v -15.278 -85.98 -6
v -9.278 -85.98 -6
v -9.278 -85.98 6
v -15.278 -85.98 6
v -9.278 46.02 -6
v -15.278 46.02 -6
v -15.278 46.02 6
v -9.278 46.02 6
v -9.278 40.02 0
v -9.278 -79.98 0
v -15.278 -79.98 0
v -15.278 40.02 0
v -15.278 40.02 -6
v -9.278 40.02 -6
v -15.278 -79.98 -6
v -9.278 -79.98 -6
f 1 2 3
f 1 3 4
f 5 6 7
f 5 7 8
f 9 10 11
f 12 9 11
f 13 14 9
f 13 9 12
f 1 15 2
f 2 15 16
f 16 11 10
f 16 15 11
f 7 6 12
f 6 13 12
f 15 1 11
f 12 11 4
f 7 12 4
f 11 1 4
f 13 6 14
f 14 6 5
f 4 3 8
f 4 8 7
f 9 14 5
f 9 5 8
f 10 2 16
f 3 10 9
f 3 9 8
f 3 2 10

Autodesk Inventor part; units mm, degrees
ref_plane "YZ Plane" through (0, 0, 0) normal (1, 0, 0) x (0, 1, 0)
ref_plane "XZ Plane" through (0, 0, 0) normal (0, 1, 0) x (-1, 0, 0)
ref_plane "XY Plane" through (0, 0, 0) normal (0, 0, 1) x (1, 0, 0)
sketch "Sketch1" plane through (0, 0, 0) normal (0, 0, 1) x (1, 0, 0)
  line L0 (538.5222, 35.1205) -> (532.3222, 35.1205) projected
  line L1 (538.5222, 52.0205) -> (538.5222, 35.1205) projected
  line L2 (538.5222, 52.0205) -> (246.9222, 52.0205) projected
  line L3 (246.9222, 52.0205) -> (246.9222, 58.0205) projected
  line L4 (246.9222, 58.0205) -> (538.5222, 58.0205) projected
  line L5 (538.5222, 74.9205) -> (538.5222, 58.0205) projected
  line L6 (523.1184, 74.9205) -> (538.5222, 74.9205) projected
  line L7 (517.9222, 77.9205) -> (523.1184, 74.9205) projected
  line L8 (517.9222, 74.9205) -> (517.9222, 77.9205) projected
  arc A0 (515.9222, 74.9205) -> (517.9222, 74.9205) centre (516.9222, 74.9205) ccw projected
  line L9 (515.9222, 77.9205) -> (515.9222, 74.9205) projected
  line L10 (510.7261, 74.9205) -> (515.9222, 77.9205) projected
  line L11 (494.3184, 74.9205) -> (510.7261, 74.9205) projected
  line L12 (489.1222, 77.9205) -> (494.3184, 74.9205) projected
  line L13 (489.1222, 74.9205) -> (489.1222, 77.9205) projected
  arc A1 (487.1222, 74.9205) -> (489.1222, 74.9205) centre (488.1222, 74.9205) ccw projected
  line L14 (487.1222, 77.9205) -> (487.1222, 74.9205) projected
  line L15 (481.9261, 74.9205) -> (487.1222, 77.9205) projected
  line L16 (465.5184, 74.9205) -> (481.9261, 74.9205) projected
  line L17 (460.3222, 77.9205) -> (465.5184, 74.9205) projected
  line L18 (460.3222, 74.9205) -> (460.3222, 77.9205) projected
  arc A2 (458.3222, 74.9205) -> (460.3222, 74.9205) centre (459.3222, 74.9205) ccw projected
  line L19 (458.3222, 77.9205) -> (458.3222, 74.9205) projected
  line L20 (453.1261, 74.9205) -> (458.3222, 77.9205) projected
  line L21 (436.7184, 74.9205) -> (453.1261, 74.9205) projected
  line L22 (431.5222, 77.9205) -> (436.7184, 74.9205) projected
  line L23 (431.5222, 74.9205) -> (431.5222, 77.9205) projected
  arc A3 (429.5222, 74.9205) -> (431.5222, 74.9205) centre (430.5222, 74.9205) ccw projected
  line L24 (429.5222, 77.9205) -> (429.5222, 74.9205) projected
  line L25 (424.3261, 74.9205) -> (429.5222, 77.9205) projected
  line L26 (407.9184, 74.9205) -> (424.3261, 74.9205) projected
  line L27 (402.7222, 77.9205) -> (407.9184, 74.9205) projected
  line L28 (402.7222, 74.9205) -> (402.7222, 77.9205) projected
  arc A4 (400.7222, 74.9205) -> (402.7222, 74.9205) centre (401.7222, 74.9205) ccw projected
  line L29 (400.7222, 77.9205) -> (400.7222, 74.9205) projected
  line L30 (395.5261, 74.9205) -> (400.7222, 77.9205) projected
  line L31 (379.1184, 74.9205) -> (395.5261, 74.9205) projected
  line L32 (373.9222, 77.9205) -> (379.1184, 74.9205) projected
  line L33 (373.9222, 74.9205) -> (373.9222, 77.9205) projected
  arc A5 (371.9222, 74.9205) -> (373.9222, 74.9205) centre (372.9222, 74.9205) ccw projected
  line L34 (371.9222, 77.9205) -> (371.9222, 74.9205) projected
  line L35 (366.7261, 74.9205) -> (371.9222, 77.9205) projected
  line L36 (350.3184, 74.9205) -> (366.7261, 74.9205) projected
  line L37 (345.1222, 77.9205) -> (350.3184, 74.9205) projected
  line L38 (345.1222, 74.9205) -> (345.1222, 77.9205) projected
  arc A6 (343.1222, 74.9205) -> (345.1222, 74.9205) centre (344.1222, 74.9205) ccw projected
  line L39 (343.1222, 77.9205) -> (343.1222, 74.9205) projected
  line L40 (337.9261, 74.9205) -> (343.1222, 77.9205) projected
  line L41 (321.5184, 74.9205) -> (337.9261, 74.9205) projected
  line L42 (316.3222, 77.9205) -> (321.5184, 74.9205) projected
  line L43 (316.3222, 74.9205) -> (316.3222, 77.9205) projected
  arc A7 (314.3222, 74.9205) -> (316.3222, 74.9205) centre (315.3222, 74.9205) ccw projected
  line L44 (314.3222, 77.9205) -> (314.3222, 74.9205) projected
  line L45 (309.1261, 74.9205) -> (314.3222, 77.9205) projected
  line L46 (292.7184, 74.9205) -> (309.1261, 74.9205) projected
  line L47 (287.5222, 77.9205) -> (292.7184, 74.9205) projected
  line L48 (287.5222, 74.9205) -> (287.5222, 77.9205) projected
  arc A8 (285.5222, 74.9205) -> (287.5222, 74.9205) centre (286.5222, 74.9205) ccw projected
  line L49 (285.5222, 77.9205) -> (285.5222, 74.9205) projected
  line L50 (280.3261, 74.9205) -> (285.5222, 77.9205) projected
  line L51 (263.9184, 74.9205) -> (280.3261, 74.9205) projected
  line L52 (258.7222, 77.9205) -> (263.9184, 74.9205) projected
  line L53 (258.7222, 74.9205) -> (258.7222, 77.9205) projected
  arc A9 (256.7222, 74.9205) -> (258.7222, 74.9205) centre (257.7222, 74.9205) ccw projected
  line L54 (256.7222, 77.9205) -> (256.7222, 74.9205) projected
  line L55 (251.5261, 74.9205) -> (256.7222, 77.9205) projected
  line L56 (235.1184, 74.9205) -> (251.5261, 74.9205) projected
  line L57 (229.9222, 77.9205) -> (235.1184, 74.9205) projected
  line L58 (229.9222, 74.9205) -> (229.9222, 77.9205) projected
  arc A10 (227.9222, 74.9205) -> (229.9222, 74.9205) centre (228.9222, 74.9205) ccw projected
  line L59 (227.9222, 77.9205) -> (227.9222, 74.9205) projected
  line L60 (222.7261, 74.9205) -> (227.9222, 77.9205) projected
  line L61 (206.3184, 74.9205) -> (222.7261, 74.9205) projected
  line L62 (201.1222, 77.9205) -> (206.3184, 74.9205) projected
  line L63 (201.1222, 74.9205) -> (201.1222, 77.9205) projected
  arc A11 (199.1222, 74.9205) -> (201.1222, 74.9205) centre (200.1222, 74.9205) ccw projected
  line L64 (199.1222, 77.9205) -> (199.1222, 74.9205) projected
  line L65 (193.9261, 74.9205) -> (199.1222, 77.9205) projected
  line L66 (177.5184, 74.9205) -> (193.9261, 74.9205) projected
  line L67 (172.3222, 77.9205) -> (177.5184, 74.9205) projected
  line L68 (172.3222, 74.9205) -> (172.3222, 77.9205) projected
  arc A12 (170.3222, 74.9205) -> (172.3222, 74.9205) centre (171.3222, 74.9205) ccw projected
  line L69 (170.3222, 77.9205) -> (170.3222, 74.9205) projected
  line L70 (165.1261, 74.9205) -> (170.3222, 77.9205) projected
  line L71 (148.7184, 74.9205) -> (165.1261, 74.9205) projected
  line L72 (143.5222, 77.9205) -> (148.7184, 74.9205) projected
  line L73 (143.5222, 74.9205) -> (143.5222, 77.9205) projected
  arc A13 (141.5222, 74.9205) -> (143.5222, 74.9205) centre (142.5222, 74.9205) ccw projected
  line L74 (141.5222, 77.9205) -> (141.5222, 74.9205) projected
  line L75 (136.3261, 74.9205) -> (141.5222, 77.9205) projected
  line L76 (119.9184, 74.9205) -> (136.3261, 74.9205) projected
  line L77 (114.7222, 77.9205) -> (119.9184, 74.9205) projected
  line L78 (114.7222, 74.9205) -> (114.7222, 77.9205) projected
  arc A14 (112.7222, 74.9205) -> (114.7222, 74.9205) centre (113.7222, 74.9205) ccw projected
  line L79 (112.7222, 77.9205) -> (112.7222, 74.9205) projected
  line L80 (107.5261, 74.9205) -> (112.7222, 77.9205) projected
  line L81 (91.1184, 74.9205) -> (107.5261, 74.9205) projected
  line L82 (85.9222, 77.9205) -> (91.1184, 74.9205) projected
  line L83 (85.9222, 74.9205) -> (85.9222, 77.9205) projected
  arc A15 (83.9222, 74.9205) -> (85.9222, 74.9205) centre (84.9222, 74.9205) ccw projected
  line L84 (83.9222, 77.9205) -> (83.9222, 74.9205) projected
  line L85 (78.7261, 74.9205) -> (83.9222, 77.9205) projected
  line L86 (62.3184, 74.9205) -> (78.7261, 74.9205) projected
  line L87 (57.1222, 77.9205) -> (62.3184, 74.9205) projected
  line L88 (57.1222, 74.9205) -> (57.1222, 77.9205) projected
  arc A16 (55.1222, 74.9205) -> (57.1222, 74.9205) centre (56.1222, 74.9205) ccw projected
  line L89 (55.1222, 77.9205) -> (55.1222, 74.9205) projected
  line L90 (49.9261, 74.9205) -> (55.1222, 77.9205) projected
  line L91 (33.5184, 74.9205) -> (49.9261, 74.9205) projected
  line L92 (28.3222, 77.9205) -> (33.5184, 74.9205) projected
  line L93 (28.3222, 74.9205) -> (28.3222, 77.9205) projected
  arc A17 (26.3222, 74.9205) -> (28.3222, 74.9205) centre (27.3222, 74.9205) ccw projected
  line L94 (26.3222, 77.9205) -> (26.3222, 74.9205) projected
  line L95 (21.1261, 74.9205) -> (26.3222, 77.9205) projected
  line L96 (4.7184, 74.9205) -> (21.1261, 74.9205) projected
  line L97 (-0.4778, 77.9205) -> (4.7184, 74.9205) projected
  line L98 (-0.4778, 74.9205) -> (-0.4778, 77.9205) projected
  arc A18 (-2.4778, 74.9205) -> (-0.4778, 74.9205) centre (-1.4778, 74.9205) ccw projected
  line L99 (-2.4778, 77.9205) -> (-2.4778, 74.9205) projected
  line L100 (-7.6739, 74.9205) -> (-2.4778, 77.9205) projected
  line L101 (-24.0816, 74.9205) -> (-7.6739, 74.9205) projected
  line L102 (-29.2778, 77.9205) -> (-24.0816, 74.9205) projected
  line L103 (-29.2778, 74.9205) -> (-29.2778, 77.9205) projected
  arc A19 (-31.2778, 74.9205) -> (-29.2778, 74.9205) centre (-30.2778, 74.9205) ccw projected
  line L104 (-31.2778, 77.9205) -> (-31.2778, 74.9205) projected
  line L105 (-36.4739, 74.9205) -> (-31.2778, 77.9205) projected
  line L106 (-36.4739, 74.9205) -> (-44.6778, 74.9205) projected
  line L107 (-44.6778, 35.1205) -> (-44.6778, 74.9205) projected
  line L108 (-22.0739, 35.1205) -> (-44.6778, 35.1205) projected
  line L109 (-16.8778, 32.1205) -> (-22.0739, 35.1205) projected
  line L110 (-16.8778, 35.1205) -> (-16.8778, 32.1205) projected
  arc A20 (-14.8778, 35.1205) -> (-16.8778, 35.1205) centre (-15.8778, 35.1205) ccw projected
  line L111 (-14.8778, 32.1205) -> (-14.8778, 35.1205) projected
  line L112 (-9.6816, 35.1205) -> (-14.8778, 32.1205) projected
  line L113 (6.7261, 35.1205) -> (-9.6816, 35.1205) projected
  line L114 (11.9222, 32.1205) -> (6.7261, 35.1205) projected
  line L115 (11.9222, 35.1205) -> (11.9222, 32.1205) projected
  arc A21 (13.9222, 35.1205) -> (11.9222, 35.1205) centre (12.9222, 35.1205) ccw projected
  line L116 (13.9222, 32.1205) -> (13.9222, 35.1205) projected
  line L117 (19.1184, 35.1205) -> (13.9222, 32.1205) projected
  line L118 (35.5261, 35.1205) -> (19.1184, 35.1205) projected
  line L119 (40.7222, 32.1205) -> (35.5261, 35.1205) projected
  line L120 (40.7222, 35.1205) -> (40.7222, 32.1205) projected
  arc A22 (42.7222, 35.1205) -> (40.7222, 35.1205) centre (41.7222, 35.1205) ccw projected
  line L121 (42.7222, 32.1205) -> (42.7222, 35.1205) projected
  line L122 (47.9184, 35.1205) -> (42.7222, 32.1205) projected
  line L123 (64.3261, 35.1205) -> (47.9184, 35.1205) projected
  line L124 (69.5222, 32.1205) -> (64.3261, 35.1205) projected
  line L125 (69.5222, 35.1205) -> (69.5222, 32.1205) projected
  arc A23 (71.5222, 35.1205) -> (69.5222, 35.1205) centre (70.5222, 35.1205) ccw projected
  line L126 (71.5222, 32.1205) -> (71.5222, 35.1205) projected
  line L127 (76.7184, 35.1205) -> (71.5222, 32.1205) projected
  line L128 (93.1261, 35.1205) -> (76.7184, 35.1205) projected
  line L129 (98.3222, 32.1205) -> (93.1261, 35.1205) projected
  line L130 (98.3222, 35.1205) -> (98.3222, 32.1205) projected
  arc A24 (100.3222, 35.1205) -> (98.3222, 35.1205) centre (99.3222, 35.1205) ccw projected
  line L131 (100.3222, 32.1205) -> (100.3222, 35.1205) projected
  line L132 (105.5184, 35.1205) -> (100.3222, 32.1205) projected
  line L133 (121.9261, 35.1205) -> (105.5184, 35.1205) projected
  line L134 (127.1222, 32.1205) -> (121.9261, 35.1205) projected
  line L135 (127.1222, 35.1205) -> (127.1222, 32.1205) projected
  arc A25 (129.1222, 35.1205) -> (127.1222, 35.1205) centre (128.1222, 35.1205) ccw projected
  line L136 (129.1222, 32.1205) -> (129.1222, 35.1205) projected
  line L137 (134.3184, 35.1205) -> (129.1222, 32.1205) projected
  line L138 (150.7261, 35.1205) -> (134.3184, 35.1205) projected
  line L139 (155.9222, 32.1205) -> (150.7261, 35.1205) projected
  line L140 (155.9222, 35.1205) -> (155.9222, 32.1205) projected
  arc A26 (157.9222, 35.1205) -> (155.9222, 35.1205) centre (156.9222, 35.1205) ccw projected
  line L141 (157.9222, 32.1205) -> (157.9222, 35.1205) projected
  line L142 (163.1184, 35.1205) -> (157.9222, 32.1205) projected
  line L143 (179.5261, 35.1205) -> (163.1184, 35.1205) projected
  line L144 (184.7222, 32.1205) -> (179.5261, 35.1205) projected
  line L145 (184.7222, 35.1205) -> (184.7222, 32.1205) projected
  arc A27 (186.7222, 35.1205) -> (184.7222, 35.1205) centre (185.7222, 35.1205) ccw projected
  line L146 (186.7222, 32.1205) -> (186.7222, 35.1205) projected
  line L147 (191.9184, 35.1205) -> (186.7222, 32.1205) projected
  line L148 (208.3261, 35.1205) -> (191.9184, 35.1205) projected
  line L149 (213.5222, 32.1205) -> (208.3261, 35.1205) projected
  line L150 (213.5222, 35.1205) -> (213.5222, 32.1205) projected
  arc A28 (215.5222, 35.1205) -> (213.5222, 35.1205) centre (214.5222, 35.1205) ccw projected
  line L151 (215.5222, 32.1205) -> (215.5222, 35.1205) projected
  line L152 (220.7184, 35.1205) -> (215.5222, 32.1205) projected
  line L153 (237.1261, 35.1205) -> (220.7184, 35.1205) projected
  line L154 (242.3222, 32.1205) -> (237.1261, 35.1205) projected
  line L155 (242.3222, 35.1205) -> (242.3222, 32.1205) projected
  arc A29 (244.3222, 35.1205) -> (242.3222, 35.1205) centre (243.3222, 35.1205) ccw projected
  line L156 (244.3222, 32.1205) -> (244.3222, 35.1205) projected
  line L157 (249.5184, 35.1205) -> (244.3222, 32.1205) projected
  line L158 (265.9261, 35.1205) -> (249.5184, 35.1205) projected
  line L159 (271.1222, 32.1205) -> (265.9261, 35.1205) projected
  line L160 (271.1222, 35.1205) -> (271.1222, 32.1205) projected
  arc A30 (273.1222, 35.1205) -> (271.1222, 35.1205) centre (272.1222, 35.1205) ccw projected
  line L161 (273.1222, 32.1205) -> (273.1222, 35.1205) projected
  line L162 (278.3184, 35.1205) -> (273.1222, 32.1205) projected
  line L163 (294.7261, 35.1205) -> (278.3184, 35.1205) projected
  line L164 (299.9222, 32.1205) -> (294.7261, 35.1205) projected
  line L165 (299.9222, 35.1205) -> (299.9222, 32.1205) projected
  arc A31 (301.9222, 35.1205) -> (299.9222, 35.1205) centre (300.9222, 35.1205) ccw projected
  line L166 (301.9222, 32.1205) -> (301.9222, 35.1205) projected
  line L167 (307.1184, 35.1205) -> (301.9222, 32.1205) projected
  line L168 (323.5261, 35.1205) -> (307.1184, 35.1205) projected
  line L169 (328.7222, 32.1205) -> (323.5261, 35.1205) projected
  line L170 (328.7222, 35.1205) -> (328.7222, 32.1205) projected
  arc A32 (330.7222, 35.1205) -> (328.7222, 35.1205) centre (329.7222, 35.1205) ccw projected
  line L171 (330.7222, 32.1205) -> (330.7222, 35.1205) projected
  line L172 (335.9184, 35.1205) -> (330.7222, 32.1205) projected
  line L173 (352.3261, 35.1205) -> (335.9184, 35.1205) projected
  line L174 (357.5222, 32.1205) -> (352.3261, 35.1205) projected
  line L175 (357.5222, 35.1205) -> (357.5222, 32.1205) projected
  arc A33 (359.5222, 35.1205) -> (357.5222, 35.1205) centre (358.5222, 35.1205) ccw projected
  line L176 (359.5222, 32.1205) -> (359.5222, 35.1205) projected
  line L177 (364.7184, 35.1205) -> (359.5222, 32.1205) projected
  line L178 (381.1261, 35.1205) -> (364.7184, 35.1205) projected
  line L179 (386.3222, 32.1205) -> (381.1261, 35.1205) projected
  line L180 (386.3222, 35.1205) -> (386.3222, 32.1205) projected
  arc A34 (388.3222, 35.1205) -> (386.3222, 35.1205) centre (387.3222, 35.1205) ccw projected
  line L181 (388.3222, 32.1205) -> (388.3222, 35.1205) projected
  line L182 (393.5184, 35.1205) -> (388.3222, 32.1205) projected
  line L183 (409.9261, 35.1205) -> (393.5184, 35.1205) projected
  line L184 (415.1222, 32.1205) -> (409.9261, 35.1205) projected
  line L185 (415.1222, 35.1205) -> (415.1222, 32.1205) projected
  arc A35 (417.1222, 35.1205) -> (415.1222, 35.1205) centre (416.1222, 35.1205) ccw projected
  line L186 (417.1222, 32.1205) -> (417.1222, 35.1205) projected
  line L187 (422.3184, 35.1205) -> (417.1222, 32.1205) projected
  line L188 (438.7261, 35.1205) -> (422.3184, 35.1205) projected
  line L189 (443.9222, 32.1205) -> (438.7261, 35.1205) projected
  line L190 (443.9222, 35.1205) -> (443.9222, 32.1205) projected
  arc A36 (445.9222, 35.1205) -> (443.9222, 35.1205) centre (444.9222, 35.1205) ccw projected
  line L191 (445.9222, 32.1205) -> (445.9222, 35.1205) projected
  line L192 (451.1184, 35.1205) -> (445.9222, 32.1205) projected
  line L193 (467.5261, 35.1205) -> (451.1184, 35.1205) projected
  line L194 (472.7222, 32.1205) -> (467.5261, 35.1205) projected
  line L195 (472.7222, 35.1205) -> (472.7222, 32.1205) projected
  arc A37 (474.7222, 35.1205) -> (472.7222, 35.1205) centre (473.7222, 35.1205) ccw projected
  line L196 (474.7222, 32.1205) -> (474.7222, 35.1205) projected
  line L197 (479.9184, 35.1205) -> (474.7222, 32.1205) projected
  line L198 (496.3261, 35.1205) -> (479.9184, 35.1205) projected
  line L199 (501.5222, 32.1205) -> (496.3261, 35.1205) projected
  line L200 (501.5222, 35.1205) -> (501.5222, 32.1205) projected
  arc A38 (503.5222, 35.1205) -> (501.5222, 35.1205) centre (502.5222, 35.1205) ccw projected
  line L201 (503.5222, 32.1205) -> (503.5222, 35.1205) projected
  line L202 (508.7184, 35.1205) -> (503.5222, 32.1205) projected
  line L203 (525.1261, 35.1205) -> (508.7184, 35.1205) projected
  line L204 (530.3222, 32.1205) -> (525.1261, 35.1205) projected
  line L205 (530.3222, 35.1205) -> (530.3222, 32.1205) projected
  arc A39 (532.3222, 35.1205) -> (530.3222, 35.1205) centre (531.3222, 35.1205) ccw projected
  line L206 (-15.2778, 46.0205) -> (-9.2778, 46.0205) projected
  line L207 (-9.2778, 46.0205) -> (-9.2778, 40.0205) projected
  line L208 (-9.2778, 40.0205) -> (-15.2778, 40.0205) projected
  line L209 (-15.2778, 40.0205) -> (-15.2778, 46.0205) projected
  line L210 (-15.2778, 64.0205) -> (-15.2778, 70.0205) projected
  line L211 (-15.2778, 70.0205) -> (-9.2778, 70.0205) projected
  line L212 (-9.2778, 70.0205) -> (-9.2778, 64.0205) projected
  line L213 (-9.2778, 64.0205) -> (-15.2778, 64.0205) projected
  line L214 (42.3222, 46.0205) -> (48.3222, 46.0205) projected
  line L215 (48.3222, 46.0205) -> (48.3222, 40.0205) projected
  line L216 (48.3222, 40.0205) -> (42.3222, 40.0205) projected
  line L217 (42.3222, 40.0205) -> (42.3222, 46.0205) projected
  line L218 (42.3222, 64.0205) -> (42.3222, 70.0205) projected
  line L219 (42.3222, 70.0205) -> (48.3222, 70.0205) projected
  line L220 (48.3222, 70.0205) -> (48.3222, 64.0205) projected
  line L221 (48.3222, 64.0205) -> (42.3222, 64.0205) projected
  line L222 (99.9222, 46.0205) -> (105.9222, 46.0205) projected
  line L223 (105.9222, 46.0205) -> (105.9222, 40.0205) projected
  line L224 (105.9222, 40.0205) -> (99.9222, 40.0205) projected
  line L225 (99.9222, 40.0205) -> (99.9222, 46.0205) projected
  line L226 (99.9222, 64.0205) -> (99.9222, 70.0205) projected
  line L227 (99.9222, 70.0205) -> (105.9222, 70.0205) projected
  line L228 (105.9222, 70.0205) -> (105.9222, 64.0205) projected
  line L229 (105.9222, 64.0205) -> (99.9222, 64.0205) projected
  line L230 (157.5222, 46.0205) -> (163.5222, 46.0205) projected
  line L231 (163.5222, 46.0205) -> (163.5222, 40.0205) projected
  line L232 (163.5222, 40.0205) -> (157.5222, 40.0205) projected
  line L233 (157.5222, 40.0205) -> (157.5222, 46.0205) projected
  line L234 (157.5222, 64.0205) -> (157.5222, 70.0205) projected
  line L235 (157.5222, 70.0205) -> (163.5222, 70.0205) projected
  line L236 (163.5222, 70.0205) -> (163.5222, 64.0205) projected
  line L237 (163.5222, 64.0205) -> (157.5222, 64.0205) projected
  line L238 (215.1222, 46.0205) -> (221.1222, 46.0205) projected
  line L239 (221.1222, 46.0205) -> (221.1222, 40.0205) projected
  line L240 (221.1222, 40.0205) -> (215.1222, 40.0205) projected
  line L241 (215.1222, 40.0205) -> (215.1222, 46.0205) projected
  line L242 (215.1222, 64.0205) -> (215.1222, 70.0205) projected
  line L243 (215.1222, 70.0205) -> (221.1222, 70.0205) projected
  line L244 (221.1222, 70.0205) -> (221.1222, 64.0205) projected
  line L245 (221.1222, 64.0205) -> (215.1222, 64.0205) projected
  line L246 (272.7222, 46.0205) -> (278.7222, 46.0205) projected
  line L247 (278.7222, 46.0205) -> (278.7222, 40.0205) projected
  line L248 (278.7222, 40.0205) -> (272.7222, 40.0205) projected
  line L249 (272.7222, 40.0205) -> (272.7222, 46.0205) projected
  line L250 (272.7222, 64.0205) -> (272.7222, 70.0205) projected
  line L251 (272.7222, 70.0205) -> (278.7222, 70.0205) projected
  line L252 (278.7222, 70.0205) -> (278.7222, 64.0205) projected
  line L253 (278.7222, 64.0205) -> (272.7222, 64.0205) projected
  line L254 (330.3222, 46.0205) -> (336.3222, 46.0205) projected
  line L255 (336.3222, 46.0205) -> (336.3222, 40.0205) projected
  line L256 (336.3222, 40.0205) -> (330.3222, 40.0205) projected
  line L257 (330.3222, 40.0205) -> (330.3222, 46.0205) projected
  line L258 (330.3222, 64.0205) -> (330.3222, 70.0205) projected
  line L259 (330.3222, 70.0205) -> (336.3222, 70.0205) projected
  line L260 (336.3222, 70.0205) -> (336.3222, 64.0205) projected
  line L261 (336.3222, 64.0205) -> (330.3222, 64.0205) projected
  line L262 (387.9222, 46.0205) -> (393.9222, 46.0205) projected
  line L263 (393.9222, 46.0205) -> (393.9222, 40.0205) projected
  line L264 (393.9222, 40.0205) -> (387.9222, 40.0205) projected
  line L265 (387.9222, 40.0205) -> (387.9222, 46.0205) projected
  line L266 (387.9222, 64.0205) -> (387.9222, 70.0205) projected
  line L267 (387.9222, 70.0205) -> (393.9222, 70.0205) projected
  line L268 (393.9222, 70.0205) -> (393.9222, 64.0205) projected
  line L269 (393.9222, 64.0205) -> (387.9222, 64.0205) projected
  line L270 (445.5222, 46.0205) -> (451.5222, 46.0205) projected
  line L271 (451.5222, 46.0205) -> (451.5222, 40.0205) projected
  line L272 (451.5222, 40.0205) -> (445.5222, 40.0205) projected
  line L273 (445.5222, 40.0205) -> (445.5222, 46.0205) projected
  line L274 (445.5222, 64.0205) -> (445.5222, 70.0205) projected
  line L275 (445.5222, 70.0205) -> (451.5222, 70.0205) projected
  line L276 (451.5222, 70.0205) -> (451.5222, 64.0205) projected
  line L277 (451.5222, 64.0205) -> (445.5222, 64.0205) projected
  line L278 (503.1222, 46.0205) -> (509.1222, 46.0205) projected
  line L279 (509.1222, 46.0205) -> (509.1222, 40.0205) projected
  line L280 (509.1222, 40.0205) -> (503.1222, 40.0205) projected
  line L281 (503.1222, 40.0205) -> (503.1222, 46.0205) projected
  line L282 (503.1222, 64.0205) -> (503.1222, 70.0205) projected
  line L283 (503.1222, 70.0205) -> (509.1222, 70.0205) projected
  line L284 (509.1222, 70.0205) -> (509.1222, 64.0205) projected
  line L285 (509.1222, 64.0205) -> (503.1222, 64.0205) projected
  line L286 (538.5222, -114.8795) -> (532.3222, -114.8795) projected
  line L287 (538.5222, -97.9795) -> (538.5222, -114.8795) projected
  line L288 (538.5222, -97.9795) -> (246.9222, -97.9795) projected
  line L289 (246.9222, -97.9795) -> (246.9222, -91.9795) projected
  line L290 (246.9222, -91.9795) -> (538.5222, -91.9795) projected
  line L291 (538.5222, -75.0795) -> (538.5222, -91.9795) projected
  line L292 (523.1184, -75.0795) -> (538.5222, -75.0795) projected
  line L293 (517.9222, -72.0795) -> (523.1184, -75.0795) projected
  line L294 (517.9222, -75.0795) -> (517.9222, -72.0795) projected
  arc A40 (515.9222, -75.0795) -> (517.9222, -75.0795) centre (516.9222, -75.0795) ccw projected
  line L295 (515.9222, -72.0795) -> (515.9222, -75.0795) projected
  line L296 (510.7261, -75.0795) -> (515.9222, -72.0795) projected
  line L297 (494.3184, -75.0795) -> (510.7261, -75.0795) projected
  line L298 (489.1222, -72.0795) -> (494.3184, -75.0795) projected
  line L299 (489.1222, -75.0795) -> (489.1222, -72.0795) projected
  arc A41 (487.1222, -75.0795) -> (489.1222, -75.0795) centre (488.1222, -75.0795) ccw projected
  line L300 (487.1222, -72.0795) -> (487.1222, -75.0795) projected
  line L301 (481.9261, -75.0795) -> (487.1222, -72.0795) projected
  line L302 (465.5184, -75.0795) -> (481.9261, -75.0795) projected
  line L303 (460.3222, -72.0795) -> (465.5184, -75.0795) projected
  line L304 (460.3222, -75.0795) -> (460.3222, -72.0795) projected
  arc A42 (458.3222, -75.0795) -> (460.3222, -75.0795) centre (459.3222, -75.0795) ccw projected
  line L305 (458.3222, -72.0795) -> (458.3222, -75.0795) projected
  line L306 (453.1261, -75.0795) -> (458.3222, -72.0795) projected
  line L307 (436.7184, -75.0795) -> (453.1261, -75.0795) projected
  line L308 (431.5222, -72.0795) -> (436.7184, -75.0795) projected
  line L309 (431.5222, -75.0795) -> (431.5222, -72.0795) projected
  arc A43 (429.5222, -75.0795) -> (431.5222, -75.0795) centre (430.5222, -75.0795) ccw projected
  line L310 (429.5222, -72.0795) -> (429.5222, -75.0795) projected
  line L311 (424.3261, -75.0795) -> (429.5222, -72.0795) projected
  line L312 (407.9184, -75.0795) -> (424.3261, -75.0795) projected
  line L313 (402.7222, -72.0795) -> (407.9184, -75.0795) projected
  line L314 (402.7222, -75.0795) -> (402.7222, -72.0795) projected
  arc A44 (400.7222, -75.0795) -> (402.7222, -75.0795) centre (401.7222, -75.0795) ccw projected
  line L315 (400.7222, -72.0795) -> (400.7222, -75.0795) projected
  line L316 (395.5261, -75.0795) -> (400.7222, -72.0795) projected
  line L317 (379.1184, -75.0795) -> (395.5261, -75.0795) projected
  line L318 (373.9222, -72.0795) -> (379.1184, -75.0795) projected
  line L319 (373.9222, -75.0795) -> (373.9222, -72.0795) projected
  arc A45 (371.9222, -75.0795) -> (373.9222, -75.0795) centre (372.9222, -75.0795) ccw projected
  line L320 (371.9222, -72.0795) -> (371.9222, -75.0795) projected
  line L321 (366.7261, -75.0795) -> (371.9222, -72.0795) projected
  line L322 (350.3184, -75.0795) -> (366.7261, -75.0795) projected
  line L323 (345.1222, -72.0795) -> (350.3184, -75.0795) projected
  line L324 (345.1222, -75.0795) -> (345.1222, -72.0795) projected
  arc A46 (343.1222, -75.0795) -> (345.1222, -75.0795) centre (344.1222, -75.0795) ccw projected
  line L325 (343.1222, -72.0795) -> (343.1222, -75.0795) projected
  line L326 (337.9261, -75.0795) -> (343.1222, -72.0795) projected
  line L327 (321.5184, -75.0795) -> (337.9261, -75.0795) projected
  line L328 (316.3222, -72.0795) -> (321.5184, -75.0795) projected
  line L329 (316.3222, -75.0795) -> (316.3222, -72.0795) projected
  arc A47 (314.3222, -75.0795) -> (316.3222, -75.0795) centre (315.3222, -75.0795) ccw projected
  line L330 (314.3222, -72.0795) -> (314.3222, -75.0795) projected
  line L331 (309.1261, -75.0795) -> (314.3222, -72.0795) projected
  line L332 (292.7184, -75.0795) -> (309.1261, -75.0795) projected
  line L333 (287.5222, -72.0795) -> (292.7184, -75.0795) projected
  line L334 (287.5222, -75.0795) -> (287.5222, -72.0795) projected
  arc A48 (285.5222, -75.0795) -> (287.5222, -75.0795) centre (286.5222, -75.0795) ccw projected
  line L335 (285.5222, -72.0795) -> (285.5222, -75.0795) projected
  line L336 (280.3261, -75.0795) -> (285.5222, -72.0795) projected
  line L337 (263.9184, -75.0795) -> (280.3261, -75.0795) projected
  line L338 (258.7222, -72.0795) -> (263.9184, -75.0795) projected
  line L339 (258.7222, -75.0795) -> (258.7222, -72.0795) projected
  arc A49 (256.7222, -75.0795) -> (258.7222, -75.0795) centre (257.7222, -75.0795) ccw projected
  line L340 (256.7222, -72.0795) -> (256.7222, -75.0795) projected
  line L341 (251.5261, -75.0795) -> (256.7222, -72.0795) projected
  line L342 (235.1184, -75.0795) -> (251.5261, -75.0795) projected
  line L343 (229.9222, -72.0795) -> (235.1184, -75.0795) projected
  line L344 (229.9222, -75.0795) -> (229.9222, -72.0795) projected
  arc A50 (227.9222, -75.0795) -> (229.9222, -75.0795) centre (228.9222, -75.0795) ccw projected
  line L345 (227.9222, -72.0795) -> (227.9222, -75.0795) projected
  line L346 (222.7261, -75.0795) -> (227.9222, -72.0795) projected
  line L347 (206.3184, -75.0795) -> (222.7261, -75.0795) projected
  line L348 (201.1222, -72.0795) -> (206.3184, -75.0795) projected
  line L349 (201.1222, -75.0795) -> (201.1222, -72.0795) projected
  arc A51 (199.1222, -75.0795) -> (201.1222, -75.0795) centre (200.1222, -75.0795) ccw projected
  line L350 (199.1222, -72.0795) -> (199.1222, -75.0795) projected
  line L351 (193.9261, -75.0795) -> (199.1222, -72.0795) projected
  line L352 (177.5184, -75.0795) -> (193.9261, -75.0795) projected
  line L353 (172.3222, -72.0795) -> (177.5184, -75.0795) projected
  line L354 (172.3222, -75.0795) -> (172.3222, -72.0795) projected
  arc A52 (170.3222, -75.0795) -> (172.3222, -75.0795) centre (171.3222, -75.0795) ccw projected
  line L355 (170.3222, -72.0795) -> (170.3222, -75.0795) projected
  line L356 (165.1261, -75.0795) -> (170.3222, -72.0795) projected
  line L357 (148.7184, -75.0795) -> (165.1261, -75.0795) projected
  line L358 (143.5222, -72.0795) -> (148.7184, -75.0795) projected
  line L359 (143.5222, -75.0795) -> (143.5222, -72.0795) projected
  arc A53 (141.5222, -75.0795) -> (143.5222, -75.0795) centre (142.5222, -75.0795) ccw projected
  line L360 (141.5222, -72.0795) -> (141.5222, -75.0795) projected
  line L361 (136.3261, -75.0795) -> (141.5222, -72.0795) projected
  line L362 (119.9184, -75.0795) -> (136.3261, -75.0795) projected
  line L363 (114.7222, -72.0795) -> (119.9184, -75.0795) projected
  line L364 (114.7222, -75.0795) -> (114.7222, -72.0795) projected
  arc A54 (112.7222, -75.0795) -> (114.7222, -75.0795) centre (113.7222, -75.0795) ccw projected
  line L365 (112.7222, -72.0795) -> (112.7222, -75.0795) projected
  line L366 (107.5261, -75.0795) -> (112.7222, -72.0795) projected
  line L367 (91.1184, -75.0795) -> (107.5261, -75.0795) projected
  line L368 (85.9222, -72.0795) -> (91.1184, -75.0795) projected
  line L369 (85.9222, -75.0795) -> (85.9222, -72.0795) projected
  arc A55 (83.9222, -75.0795) -> (85.9222, -75.0795) centre (84.9222, -75.0795) ccw projected
  line L370 (83.9222, -72.0795) -> (83.9222, -75.0795) projected
  line L371 (78.7261, -75.0795) -> (83.9222, -72.0795) projected
  line L372 (62.3184, -75.0795) -> (78.7261, -75.0795) projected
  line L373 (57.1222, -72.0795) -> (62.3184, -75.0795) projected
  line L374 (57.1222, -75.0795) -> (57.1222, -72.0795) projected
  arc A56 (55.1222, -75.0795) -> (57.1222, -75.0795) centre (56.1222, -75.0795) ccw projected
  line L375 (55.1222, -72.0795) -> (55.1222, -75.0795) projected
  line L376 (49.9261, -75.0795) -> (55.1222, -72.0795) projected
  line L377 (33.5184, -75.0795) -> (49.9261, -75.0795) projected
  line L378 (28.3222, -72.0795) -> (33.5184, -75.0795) projected
  line L379 (28.3222, -75.0795) -> (28.3222, -72.0795) projected
  arc A57 (26.3222, -75.0795) -> (28.3222, -75.0795) centre (27.3222, -75.0795) ccw projected
  line L380 (26.3222, -72.0795) -> (26.3222, -75.0795) projected
  line L381 (21.1261, -75.0795) -> (26.3222, -72.0795) projected
  line L382 (4.7184, -75.0795) -> (21.1261, -75.0795) projected
  line L383 (-0.4778, -72.0795) -> (4.7184, -75.0795) projected
  line L384 (-0.4778, -75.0795) -> (-0.4778, -72.0795) projected
  arc A58 (-2.4778, -75.0795) -> (-0.4778, -75.0795) centre (-1.4778, -75.0795) ccw projected
  line L385 (-2.4778, -72.0795) -> (-2.4778, -75.0795) projected
  line L386 (-7.6739, -75.0795) -> (-2.4778, -72.0795) projected
  line L387 (-24.0816, -75.0795) -> (-7.6739, -75.0795) projected
  line L388 (-29.2778, -72.0795) -> (-24.0816, -75.0795) projected
  line L389 (-29.2778, -75.0795) -> (-29.2778, -72.0795) projected
  arc A59 (-31.2778, -75.0795) -> (-29.2778, -75.0795) centre (-30.2778, -75.0795) ccw projected
  line L390 (-31.2778, -72.0795) -> (-31.2778, -75.0795) projected
  line L391 (-36.4739, -75.0795) -> (-31.2778, -72.0795) projected
  line L392 (-36.4739, -75.0795) -> (-44.6778, -75.0795) projected
  line L393 (-44.6778, -114.8795) -> (-44.6778, -75.0795) projected
  line L394 (-22.0739, -114.8795) -> (-44.6778, -114.8795) projected
  line L395 (-16.8778, -117.8795) -> (-22.0739, -114.8795) projected
  line L396 (-16.8778, -114.8795) -> (-16.8778, -117.8795) projected
  arc A60 (-14.8778, -114.8795) -> (-16.8778, -114.8795) centre (-15.8778, -114.8795) ccw projected
  line L397 (-14.8778, -117.8795) -> (-14.8778, -114.8795) projected
  line L398 (-9.6816, -114.8795) -> (-14.8778, -117.8795) projected
  line L399 (6.7261, -114.8795) -> (-9.6816, -114.8795) projected
  line L400 (11.9222, -117.8795) -> (6.7261, -114.8795) projected
  line L401 (11.9222, -114.8795) -> (11.9222, -117.8795) projected
  arc A61 (13.9222, -114.8795) -> (11.9222, -114.8795) centre (12.9222, -114.8795) ccw projected
  line L402 (13.9222, -117.8795) -> (13.9222, -114.8795) projected
  line L403 (19.1184, -114.8795) -> (13.9222, -117.8795) projected
  line L404 (35.5261, -114.8795) -> (19.1184, -114.8795) projected
  line L405 (40.7222, -117.8795) -> (35.5261, -114.8795) projected
  line L406 (40.7222, -114.8795) -> (40.7222, -117.8795) projected
  arc A62 (42.7222, -114.8795) -> (40.7222, -114.8795) centre (41.7222, -114.8795) ccw projected
  line L407 (42.7222, -117.8795) -> (42.7222, -114.8795) projected
  line L408 (47.9184, -114.8795) -> (42.7222, -117.8795) projected
  line L409 (64.3261, -114.8795) -> (47.9184, -114.8795) projected
  line L410 (69.5222, -117.8795) -> (64.3261, -114.8795) projected
  line L411 (69.5222, -114.8795) -> (69.5222, -117.8795) projected
  arc A63 (71.5222, -114.8795) -> (69.5222, -114.8795) centre (70.5222, -114.8795) ccw projected
  line L412 (71.5222, -117.8795) -> (71.5222, -114.8795) projected
  line L413 (76.7184, -114.8795) -> (71.5222, -117.8795) projected
  line L414 (93.1261, -114.8795) -> (76.7184, -114.8795) projected
  line L415 (98.3222, -117.8795) -> (93.1261, -114.8795) projected
  line L416 (98.3222, -114.8795) -> (98.3222, -117.8795) projected
  arc A64 (100.3222, -114.8795) -> (98.3222, -114.8795) centre (99.3222, -114.8795) ccw projected
  line L417 (100.3222, -117.8795) -> (100.3222, -114.8795) projected
  line L418 (105.5184, -114.8795) -> (100.3222, -117.8795) projected
  line L419 (121.9261, -114.8795) -> (105.5184, -114.8795) projected
  line L420 (127.1222, -117.8795) -> (121.9261, -114.8795) projected
  line L421 (127.1222, -114.8795) -> (127.1222, -117.8795) projected
  arc A65 (129.1222, -114.8795) -> (127.1222, -114.8795) centre (128.1222, -114.8795) ccw projected
  line L422 (129.1222, -117.8795) -> (129.1222, -114.8795) projected
  line L423 (134.3184, -114.8795) -> (129.1222, -117.8795) projected
  line L424 (150.7261, -114.8795) -> (134.3184, -114.8795) projected
  line L425 (155.9222, -117.8795) -> (150.7261, -114.8795) projected
  line L426 (155.9222, -114.8795) -> (155.9222, -117.8795) projected
  arc A66 (157.9222, -114.8795) -> (155.9222, -114.8795) centre (156.9222, -114.8795) ccw projected
  line L427 (157.9222, -117.8795) -> (157.9222, -114.8795) projected
  line L428 (163.1184, -114.8795) -> (157.9222, -117.8795) projected
  line L429 (179.5261, -114.8795) -> (163.1184, -114.8795) projected
  line L430 (184.7222, -117.8795) -> (179.5261, -114.8795) projected
  line L431 (184.7222, -114.8795) -> (184.7222, -117.8795) projected
  arc A67 (186.7222, -114.8795) -> (184.7222, -114.8795) centre (185.7222, -114.8795) ccw projected
  line L432 (186.7222, -117.8795) -> (186.7222, -114.8795) projected
  line L433 (191.9184, -114.8795) -> (186.7222, -117.8795) projected
  line L434 (208.3261, -114.8795) -> (191.9184, -114.8795) projected
  line L435 (213.5222, -117.8795) -> (208.3261, -114.8795) projected
  line L436 (213.5222, -114.8795) -> (213.5222, -117.8795) projected
  arc A68 (215.5222, -114.8795) -> (213.5222, -114.8795) centre (214.5222, -114.8795) ccw projected
  line L437 (215.5222, -117.8795) -> (215.5222, -114.8795) projected
  line L438 (220.7184, -114.8795) -> (215.5222, -117.8795) projected
  line L439 (237.1261, -114.8795) -> (220.7184, -114.8795) projected
  line L440 (242.3222, -117.8795) -> (237.1261, -114.8795) projected
  line L441 (242.3222, -114.8795) -> (242.3222, -117.8795) projected
  arc A69 (244.3222, -114.8795) -> (242.3222, -114.8795) centre (243.3222, -114.8795) ccw projected
  line L442 (244.3222, -117.8795) -> (244.3222, -114.8795) projected
  line L443 (249.5184, -114.8795) -> (244.3222, -117.8795) projected
  line L444 (265.9261, -114.8795) -> (249.5184, -114.8795) projected
  line L445 (271.1222, -117.8795) -> (265.9261, -114.8795) projected
  line L446 (271.1222, -114.8795) -> (271.1222, -117.8795) projected
  arc A70 (273.1222, -114.8795) -> (271.1222, -114.8795) centre (272.1222, -114.8795) ccw projected
  line L447 (273.1222, -117.8795) -> (273.1222, -114.8795) projected
  line L448 (278.3184, -114.8795) -> (273.1222, -117.8795) projected
  line L449 (294.7261, -114.8795) -> (278.3184, -114.8795) projected
  line L450 (299.9222, -117.8795) -> (294.7261, -114.8795) projected
  line L451 (299.9222, -114.8795) -> (299.9222, -117.8795) projected
  arc A71 (301.9222, -114.8795) -> (299.9222, -114.8795) centre (300.9222, -114.8795) ccw projected
  line L452 (301.9222, -117.8795) -> (301.9222, -114.8795) projected
  line L453 (307.1184, -114.8795) -> (301.9222, -117.8795) projected
  line L454 (323.5261, -114.8795) -> (307.1184, -114.8795) projected
  line L455 (328.7222, -117.8795) -> (323.5261, -114.8795) projected
  line L456 (328.7222, -114.8795) -> (328.7222, -117.8795) projected
  arc A72 (330.7222, -114.8795) -> (328.7222, -114.8795) centre (329.7222, -114.8795) ccw projected
  line L457 (330.7222, -117.8795) -> (330.7222, -114.8795) projected
  line L458 (335.9184, -114.8795) -> (330.7222, -117.8795) projected
  line L459 (352.3261, -114.8795) -> (335.9184, -114.8795) projected
  line L460 (357.5222, -117.8795) -> (352.3261, -114.8795) projected
  line L461 (357.5222, -114.8795) -> (357.5222, -117.8795) projected
  arc A73 (359.5222, -114.8795) -> (357.5222, -114.8795) centre (358.5222, -114.8795) ccw projected
  line L462 (359.5222, -117.8795) -> (359.5222, -114.8795) projected
  line L463 (364.7184, -114.8795) -> (359.5222, -117.8795) projected
  line L464 (381.1261, -114.8795) -> (364.7184, -114.8795) projected
  line L465 (386.3222, -117.8795) -> (381.1261, -114.8795) projected
  line L466 (386.3222, -114.8795) -> (386.3222, -117.8795) projected
  arc A74 (388.3222, -114.8795) -> (386.3222, -114.8795) centre (387.3222, -114.8795) ccw projected
  line L467 (388.3222, -117.8795) -> (388.3222, -114.8795) projected
  line L468 (393.5184, -114.8795) -> (388.3222, -117.8795) projected
  line L469 (409.9261, -114.8795) -> (393.5184, -114.8795) projected
  line L470 (415.1222, -117.8795) -> (409.9261, -114.8795) projected
  line L471 (415.1222, -114.8795) -> (415.1222, -117.8795) projected
  arc A75 (417.1222, -114.8795) -> (415.1222, -114.8795) centre (416.1222, -114.8795) ccw projected
  line L472 (417.1222, -117.8795) -> (417.1222, -114.8795) projected
  line L473 (422.3184, -114.8795) -> (417.1222, -117.8795) projected
  line L474 (438.7261, -114.8795) -> (422.3184, -114.8795) projected
  line L475 (443.9222, -117.8795) -> (438.7261, -114.8795) projected
  line L476 (443.9222, -114.8795) -> (443.9222, -117.8795) projected
  arc A76 (445.9222, -114.8795) -> (443.9222, -114.8795) centre (444.9222, -114.8795) ccw projected
  line L477 (445.9222, -117.8795) -> (445.9222, -114.8795) projected
  line L478 (451.1184, -114.8795) -> (445.9222, -117.8795) projected
  line L479 (467.5261, -114.8795) -> (451.1184, -114.8795) projected
  line L480 (472.7222, -117.8795) -> (467.5261, -114.8795) projected
  line L481 (472.7222, -114.8795) -> (472.7222, -117.8795) projected
  arc A77 (474.7222, -114.8795) -> (472.7222, -114.8795) centre (473.7222, -114.8795) ccw projected
  line L482 (474.7222, -117.8795) -> (474.7222, -114.8795) projected
  line L483 (479.9184, -114.8795) -> (474.7222, -117.8795) projected
  line L484 (496.3261, -114.8795) -> (479.9184, -114.8795) projected
  line L485 (501.5222, -117.8795) -> (496.3261, -114.8795) projected
  line L486 (501.5222, -114.8795) -> (501.5222, -117.8795) projected
  arc A78 (503.5222, -114.8795) -> (501.5222, -114.8795) centre (502.5222, -114.8795) ccw projected
  line L487 (503.5222, -117.8795) -> (503.5222, -114.8795) projected
  line L488 (508.7184, -114.8795) -> (503.5222, -117.8795) projected
  line L489 (525.1261, -114.8795) -> (508.7184, -114.8795) projected
  line L490 (530.3222, -117.8795) -> (525.1261, -114.8795) projected
  line L491 (530.3222, -114.8795) -> (530.3222, -117.8795) projected
  arc A79 (532.3222, -114.8795) -> (530.3222, -114.8795) centre (531.3222, -114.8795) ccw projected
  line L492 (-15.2778, -103.9795) -> (-9.2778, -103.9795) projected
  line L493 (-9.2778, -103.9795) -> (-9.2778, -109.9795) projected
  line L494 (-9.2778, -109.9795) -> (-15.2778, -109.9795) projected
  line L495 (-15.2778, -109.9795) -> (-15.2778, -103.9795) projected
  line L496 (-15.2778, -85.9795) -> (-15.2778, -79.9795) projected
  line L497 (-15.2778, -79.9795) -> (-9.2778, -79.9795) projected
  line L498 (-9.2778, -79.9795) -> (-9.2778, -85.9795) projected
  line L499 (-9.2778, -85.9795) -> (-15.2778, -85.9795) projected
  line L500 (42.3222, -103.9795) -> (48.3222, -103.9795) projected
  line L501 (48.3222, -103.9795) -> (48.3222, -109.9795) projected
  line L502 (48.3222, -109.9795) -> (42.3222, -109.9795) projected
  line L503 (42.3222, -109.9795) -> (42.3222, -103.9795) projected
  line L504 (42.3222, -85.9795) -> (42.3222, -79.9795) projected
  line L505 (42.3222, -79.9795) -> (48.3222, -79.9795) projected
  line L506 (48.3222, -79.9795) -> (48.3222, -85.9795) projected
  line L507 (48.3222, -85.9795) -> (42.3222, -85.9795) projected
  line L508 (99.9222, -103.9795) -> (105.9222, -103.9795) projected
  line L509 (105.9222, -103.9795) -> (105.9222, -109.9795) projected
  line L510 (105.9222, -109.9795) -> (99.9222, -109.9795) projected
  line L511 (99.9222, -109.9795) -> (99.9222, -103.9795) projected
  line L512 (99.9222, -85.9795) -> (99.9222, -79.9795) projected
  line L513 (99.9222, -79.9795) -> (105.9222, -79.9795) projected
  line L514 (105.9222, -79.9795) -> (105.9222, -85.9795) projected
  line L515 (105.9222, -85.9795) -> (99.9222, -85.9795) projected
  line L516 (157.5222, -103.9795) -> (163.5222, -103.9795) projected
  line L517 (163.5222, -103.9795) -> (163.5222, -109.9795) projected
  line L518 (163.5222, -109.9795) -> (157.5222, -109.9795) projected
  line L519 (157.5222, -109.9795) -> (157.5222, -103.9795) projected
  line L520 (157.5222, -85.9795) -> (157.5222, -79.9795) projected
  line L521 (157.5222, -79.9795) -> (163.5222, -79.9795) projected
  line L522 (163.5222, -79.9795) -> (163.5222, -85.9795) projected
  line L523 (163.5222, -85.9795) -> (157.5222, -85.9795) projected
  line L524 (215.1222, -103.9795) -> (221.1222, -103.9795) projected
  line L525 (221.1222, -103.9795) -> (221.1222, -109.9795) projected
  line L526 (221.1222, -109.9795) -> (215.1222, -109.9795) projected
  line L527 (215.1222, -109.9795) -> (215.1222, -103.9795) projected
  line L528 (215.1222, -85.9795) -> (215.1222, -79.9795) projected
  line L529 (215.1222, -79.9795) -> (221.1222, -79.9795) projected
  line L530 (221.1222, -79.9795) -> (221.1222, -85.9795) projected
  line L531 (221.1222, -85.9795) -> (215.1222, -85.9795) projected
  line L532 (272.7222, -103.9795) -> (278.7222, -103.9795) projected
  line L533 (278.7222, -103.9795) -> (278.7222, -109.9795) projected
  line L534 (278.7222, -109.9795) -> (272.7222, -109.9795) projected
  line L535 (272.7222, -109.9795) -> (272.7222, -103.9795) projected
  line L536 (272.7222, -85.9795) -> (272.7222, -79.9795) projected
  line L537 (272.7222, -79.9795) -> (278.7222, -79.9795) projected
  line L538 (278.7222, -79.9795) -> (278.7222, -85.9795) projected
  line L539 (278.7222, -85.9795) -> (272.7222, -85.9795) projected
  line L540 (330.3222, -103.9795) -> (336.3222, -103.9795) projected
  line L541 (336.3222, -103.9795) -> (336.3222, -109.9795) projected
  line L542 (336.3222, -109.9795) -> (330.3222, -109.9795) projected
  line L543 (330.3222, -109.9795) -> (330.3222, -103.9795) projected
  line L544 (330.3222, -85.9795) -> (330.3222, -79.9795) projected
  line L545 (330.3222, -79.9795) -> (336.3222, -79.9795) projected
  line L546 (336.3222, -79.9795) -> (336.3222, -85.9795) projected
  line L547 (336.3222, -85.9795) -> (330.3222, -85.9795) projected
  line L548 (387.9222, -103.9795) -> (393.9222, -103.9795) projected
  line L549 (393.9222, -103.9795) -> (393.9222, -109.9795) projected
  line L550 (393.9222, -109.9795) -> (387.9222, -109.9795) projected
  line L551 (387.9222, -109.9795) -> (387.9222, -103.9795) projected
  line L552 (387.9222, -85.9795) -> (387.9222, -79.9795) projected
  line L553 (387.9222, -79.9795) -> (393.9222, -79.9795) projected
  line L554 (393.9222, -79.9795) -> (393.9222, -85.9795) projected
  line L555 (393.9222, -85.9795) -> (387.9222, -85.9795) projected
  line L556 (445.5222, -103.9795) -> (451.5222, -103.9795) projected
  line L557 (451.5222, -103.9795) -> (451.5222, -109.9795) projected
  line L558 (451.5222, -109.9795) -> (445.5222, -109.9795) projected
  line L559 (445.5222, -109.9795) -> (445.5222, -103.9795) projected
  line L560 (445.5222, -85.9795) -> (445.5222, -79.9795) projected
  line L561 (445.5222, -79.9795) -> (451.5222, -79.9795) projected
  line L562 (451.5222, -79.9795) -> (451.5222, -85.9795) projected
  line L563 (451.5222, -85.9795) -> (445.5222, -85.9795) projected
  line L564 (503.1222, -103.9795) -> (509.1222, -103.9795) projected
  line L565 (509.1222, -103.9795) -> (509.1222, -109.9795) projected
  line L566 (509.1222, -109.9795) -> (503.1222, -109.9795) projected
  line L567 (503.1222, -109.9795) -> (503.1222, -103.9795) projected
  line L568 (503.1222, -85.9795) -> (503.1222, -79.9795) projected
  line L569 (503.1222, -79.9795) -> (509.1222, -79.9795) projected
  line L570 (509.1222, -79.9795) -> (509.1222, -85.9795) projected
  line L571 (509.1222, -85.9795) -> (503.1222, -85.9795) projected
  point P0 (0, 0)
extrude "Extrusion1" add sketch "Sketch1" along normal blind 6 and the other way blind 6 contours L206 L207 L208 L209 | L496 L497 L498 L499
sketch "Sketch2" plane through (-15.2778, -79.9795, 6) normal (0, 1, 0) x (1, 0, 0)
  line L0 (6, 0) -> (0, 0) projected
  line L1 (6, 12) -> (6, 0) projected
  line L2 (0, 0) -> (6, 0)
  line L3 (6, 0) -> (6, 6)
  line L4 (6, 6) -> (0, 6)
  line L5 (0, 6) -> (0, 0)
  point P0 (15.2778, 6)
  dimension "d4" = 6
extrude "Extrusion2" add sketch "Sketch2" along normal up to next
properties part number "ReinforcerLarge"
